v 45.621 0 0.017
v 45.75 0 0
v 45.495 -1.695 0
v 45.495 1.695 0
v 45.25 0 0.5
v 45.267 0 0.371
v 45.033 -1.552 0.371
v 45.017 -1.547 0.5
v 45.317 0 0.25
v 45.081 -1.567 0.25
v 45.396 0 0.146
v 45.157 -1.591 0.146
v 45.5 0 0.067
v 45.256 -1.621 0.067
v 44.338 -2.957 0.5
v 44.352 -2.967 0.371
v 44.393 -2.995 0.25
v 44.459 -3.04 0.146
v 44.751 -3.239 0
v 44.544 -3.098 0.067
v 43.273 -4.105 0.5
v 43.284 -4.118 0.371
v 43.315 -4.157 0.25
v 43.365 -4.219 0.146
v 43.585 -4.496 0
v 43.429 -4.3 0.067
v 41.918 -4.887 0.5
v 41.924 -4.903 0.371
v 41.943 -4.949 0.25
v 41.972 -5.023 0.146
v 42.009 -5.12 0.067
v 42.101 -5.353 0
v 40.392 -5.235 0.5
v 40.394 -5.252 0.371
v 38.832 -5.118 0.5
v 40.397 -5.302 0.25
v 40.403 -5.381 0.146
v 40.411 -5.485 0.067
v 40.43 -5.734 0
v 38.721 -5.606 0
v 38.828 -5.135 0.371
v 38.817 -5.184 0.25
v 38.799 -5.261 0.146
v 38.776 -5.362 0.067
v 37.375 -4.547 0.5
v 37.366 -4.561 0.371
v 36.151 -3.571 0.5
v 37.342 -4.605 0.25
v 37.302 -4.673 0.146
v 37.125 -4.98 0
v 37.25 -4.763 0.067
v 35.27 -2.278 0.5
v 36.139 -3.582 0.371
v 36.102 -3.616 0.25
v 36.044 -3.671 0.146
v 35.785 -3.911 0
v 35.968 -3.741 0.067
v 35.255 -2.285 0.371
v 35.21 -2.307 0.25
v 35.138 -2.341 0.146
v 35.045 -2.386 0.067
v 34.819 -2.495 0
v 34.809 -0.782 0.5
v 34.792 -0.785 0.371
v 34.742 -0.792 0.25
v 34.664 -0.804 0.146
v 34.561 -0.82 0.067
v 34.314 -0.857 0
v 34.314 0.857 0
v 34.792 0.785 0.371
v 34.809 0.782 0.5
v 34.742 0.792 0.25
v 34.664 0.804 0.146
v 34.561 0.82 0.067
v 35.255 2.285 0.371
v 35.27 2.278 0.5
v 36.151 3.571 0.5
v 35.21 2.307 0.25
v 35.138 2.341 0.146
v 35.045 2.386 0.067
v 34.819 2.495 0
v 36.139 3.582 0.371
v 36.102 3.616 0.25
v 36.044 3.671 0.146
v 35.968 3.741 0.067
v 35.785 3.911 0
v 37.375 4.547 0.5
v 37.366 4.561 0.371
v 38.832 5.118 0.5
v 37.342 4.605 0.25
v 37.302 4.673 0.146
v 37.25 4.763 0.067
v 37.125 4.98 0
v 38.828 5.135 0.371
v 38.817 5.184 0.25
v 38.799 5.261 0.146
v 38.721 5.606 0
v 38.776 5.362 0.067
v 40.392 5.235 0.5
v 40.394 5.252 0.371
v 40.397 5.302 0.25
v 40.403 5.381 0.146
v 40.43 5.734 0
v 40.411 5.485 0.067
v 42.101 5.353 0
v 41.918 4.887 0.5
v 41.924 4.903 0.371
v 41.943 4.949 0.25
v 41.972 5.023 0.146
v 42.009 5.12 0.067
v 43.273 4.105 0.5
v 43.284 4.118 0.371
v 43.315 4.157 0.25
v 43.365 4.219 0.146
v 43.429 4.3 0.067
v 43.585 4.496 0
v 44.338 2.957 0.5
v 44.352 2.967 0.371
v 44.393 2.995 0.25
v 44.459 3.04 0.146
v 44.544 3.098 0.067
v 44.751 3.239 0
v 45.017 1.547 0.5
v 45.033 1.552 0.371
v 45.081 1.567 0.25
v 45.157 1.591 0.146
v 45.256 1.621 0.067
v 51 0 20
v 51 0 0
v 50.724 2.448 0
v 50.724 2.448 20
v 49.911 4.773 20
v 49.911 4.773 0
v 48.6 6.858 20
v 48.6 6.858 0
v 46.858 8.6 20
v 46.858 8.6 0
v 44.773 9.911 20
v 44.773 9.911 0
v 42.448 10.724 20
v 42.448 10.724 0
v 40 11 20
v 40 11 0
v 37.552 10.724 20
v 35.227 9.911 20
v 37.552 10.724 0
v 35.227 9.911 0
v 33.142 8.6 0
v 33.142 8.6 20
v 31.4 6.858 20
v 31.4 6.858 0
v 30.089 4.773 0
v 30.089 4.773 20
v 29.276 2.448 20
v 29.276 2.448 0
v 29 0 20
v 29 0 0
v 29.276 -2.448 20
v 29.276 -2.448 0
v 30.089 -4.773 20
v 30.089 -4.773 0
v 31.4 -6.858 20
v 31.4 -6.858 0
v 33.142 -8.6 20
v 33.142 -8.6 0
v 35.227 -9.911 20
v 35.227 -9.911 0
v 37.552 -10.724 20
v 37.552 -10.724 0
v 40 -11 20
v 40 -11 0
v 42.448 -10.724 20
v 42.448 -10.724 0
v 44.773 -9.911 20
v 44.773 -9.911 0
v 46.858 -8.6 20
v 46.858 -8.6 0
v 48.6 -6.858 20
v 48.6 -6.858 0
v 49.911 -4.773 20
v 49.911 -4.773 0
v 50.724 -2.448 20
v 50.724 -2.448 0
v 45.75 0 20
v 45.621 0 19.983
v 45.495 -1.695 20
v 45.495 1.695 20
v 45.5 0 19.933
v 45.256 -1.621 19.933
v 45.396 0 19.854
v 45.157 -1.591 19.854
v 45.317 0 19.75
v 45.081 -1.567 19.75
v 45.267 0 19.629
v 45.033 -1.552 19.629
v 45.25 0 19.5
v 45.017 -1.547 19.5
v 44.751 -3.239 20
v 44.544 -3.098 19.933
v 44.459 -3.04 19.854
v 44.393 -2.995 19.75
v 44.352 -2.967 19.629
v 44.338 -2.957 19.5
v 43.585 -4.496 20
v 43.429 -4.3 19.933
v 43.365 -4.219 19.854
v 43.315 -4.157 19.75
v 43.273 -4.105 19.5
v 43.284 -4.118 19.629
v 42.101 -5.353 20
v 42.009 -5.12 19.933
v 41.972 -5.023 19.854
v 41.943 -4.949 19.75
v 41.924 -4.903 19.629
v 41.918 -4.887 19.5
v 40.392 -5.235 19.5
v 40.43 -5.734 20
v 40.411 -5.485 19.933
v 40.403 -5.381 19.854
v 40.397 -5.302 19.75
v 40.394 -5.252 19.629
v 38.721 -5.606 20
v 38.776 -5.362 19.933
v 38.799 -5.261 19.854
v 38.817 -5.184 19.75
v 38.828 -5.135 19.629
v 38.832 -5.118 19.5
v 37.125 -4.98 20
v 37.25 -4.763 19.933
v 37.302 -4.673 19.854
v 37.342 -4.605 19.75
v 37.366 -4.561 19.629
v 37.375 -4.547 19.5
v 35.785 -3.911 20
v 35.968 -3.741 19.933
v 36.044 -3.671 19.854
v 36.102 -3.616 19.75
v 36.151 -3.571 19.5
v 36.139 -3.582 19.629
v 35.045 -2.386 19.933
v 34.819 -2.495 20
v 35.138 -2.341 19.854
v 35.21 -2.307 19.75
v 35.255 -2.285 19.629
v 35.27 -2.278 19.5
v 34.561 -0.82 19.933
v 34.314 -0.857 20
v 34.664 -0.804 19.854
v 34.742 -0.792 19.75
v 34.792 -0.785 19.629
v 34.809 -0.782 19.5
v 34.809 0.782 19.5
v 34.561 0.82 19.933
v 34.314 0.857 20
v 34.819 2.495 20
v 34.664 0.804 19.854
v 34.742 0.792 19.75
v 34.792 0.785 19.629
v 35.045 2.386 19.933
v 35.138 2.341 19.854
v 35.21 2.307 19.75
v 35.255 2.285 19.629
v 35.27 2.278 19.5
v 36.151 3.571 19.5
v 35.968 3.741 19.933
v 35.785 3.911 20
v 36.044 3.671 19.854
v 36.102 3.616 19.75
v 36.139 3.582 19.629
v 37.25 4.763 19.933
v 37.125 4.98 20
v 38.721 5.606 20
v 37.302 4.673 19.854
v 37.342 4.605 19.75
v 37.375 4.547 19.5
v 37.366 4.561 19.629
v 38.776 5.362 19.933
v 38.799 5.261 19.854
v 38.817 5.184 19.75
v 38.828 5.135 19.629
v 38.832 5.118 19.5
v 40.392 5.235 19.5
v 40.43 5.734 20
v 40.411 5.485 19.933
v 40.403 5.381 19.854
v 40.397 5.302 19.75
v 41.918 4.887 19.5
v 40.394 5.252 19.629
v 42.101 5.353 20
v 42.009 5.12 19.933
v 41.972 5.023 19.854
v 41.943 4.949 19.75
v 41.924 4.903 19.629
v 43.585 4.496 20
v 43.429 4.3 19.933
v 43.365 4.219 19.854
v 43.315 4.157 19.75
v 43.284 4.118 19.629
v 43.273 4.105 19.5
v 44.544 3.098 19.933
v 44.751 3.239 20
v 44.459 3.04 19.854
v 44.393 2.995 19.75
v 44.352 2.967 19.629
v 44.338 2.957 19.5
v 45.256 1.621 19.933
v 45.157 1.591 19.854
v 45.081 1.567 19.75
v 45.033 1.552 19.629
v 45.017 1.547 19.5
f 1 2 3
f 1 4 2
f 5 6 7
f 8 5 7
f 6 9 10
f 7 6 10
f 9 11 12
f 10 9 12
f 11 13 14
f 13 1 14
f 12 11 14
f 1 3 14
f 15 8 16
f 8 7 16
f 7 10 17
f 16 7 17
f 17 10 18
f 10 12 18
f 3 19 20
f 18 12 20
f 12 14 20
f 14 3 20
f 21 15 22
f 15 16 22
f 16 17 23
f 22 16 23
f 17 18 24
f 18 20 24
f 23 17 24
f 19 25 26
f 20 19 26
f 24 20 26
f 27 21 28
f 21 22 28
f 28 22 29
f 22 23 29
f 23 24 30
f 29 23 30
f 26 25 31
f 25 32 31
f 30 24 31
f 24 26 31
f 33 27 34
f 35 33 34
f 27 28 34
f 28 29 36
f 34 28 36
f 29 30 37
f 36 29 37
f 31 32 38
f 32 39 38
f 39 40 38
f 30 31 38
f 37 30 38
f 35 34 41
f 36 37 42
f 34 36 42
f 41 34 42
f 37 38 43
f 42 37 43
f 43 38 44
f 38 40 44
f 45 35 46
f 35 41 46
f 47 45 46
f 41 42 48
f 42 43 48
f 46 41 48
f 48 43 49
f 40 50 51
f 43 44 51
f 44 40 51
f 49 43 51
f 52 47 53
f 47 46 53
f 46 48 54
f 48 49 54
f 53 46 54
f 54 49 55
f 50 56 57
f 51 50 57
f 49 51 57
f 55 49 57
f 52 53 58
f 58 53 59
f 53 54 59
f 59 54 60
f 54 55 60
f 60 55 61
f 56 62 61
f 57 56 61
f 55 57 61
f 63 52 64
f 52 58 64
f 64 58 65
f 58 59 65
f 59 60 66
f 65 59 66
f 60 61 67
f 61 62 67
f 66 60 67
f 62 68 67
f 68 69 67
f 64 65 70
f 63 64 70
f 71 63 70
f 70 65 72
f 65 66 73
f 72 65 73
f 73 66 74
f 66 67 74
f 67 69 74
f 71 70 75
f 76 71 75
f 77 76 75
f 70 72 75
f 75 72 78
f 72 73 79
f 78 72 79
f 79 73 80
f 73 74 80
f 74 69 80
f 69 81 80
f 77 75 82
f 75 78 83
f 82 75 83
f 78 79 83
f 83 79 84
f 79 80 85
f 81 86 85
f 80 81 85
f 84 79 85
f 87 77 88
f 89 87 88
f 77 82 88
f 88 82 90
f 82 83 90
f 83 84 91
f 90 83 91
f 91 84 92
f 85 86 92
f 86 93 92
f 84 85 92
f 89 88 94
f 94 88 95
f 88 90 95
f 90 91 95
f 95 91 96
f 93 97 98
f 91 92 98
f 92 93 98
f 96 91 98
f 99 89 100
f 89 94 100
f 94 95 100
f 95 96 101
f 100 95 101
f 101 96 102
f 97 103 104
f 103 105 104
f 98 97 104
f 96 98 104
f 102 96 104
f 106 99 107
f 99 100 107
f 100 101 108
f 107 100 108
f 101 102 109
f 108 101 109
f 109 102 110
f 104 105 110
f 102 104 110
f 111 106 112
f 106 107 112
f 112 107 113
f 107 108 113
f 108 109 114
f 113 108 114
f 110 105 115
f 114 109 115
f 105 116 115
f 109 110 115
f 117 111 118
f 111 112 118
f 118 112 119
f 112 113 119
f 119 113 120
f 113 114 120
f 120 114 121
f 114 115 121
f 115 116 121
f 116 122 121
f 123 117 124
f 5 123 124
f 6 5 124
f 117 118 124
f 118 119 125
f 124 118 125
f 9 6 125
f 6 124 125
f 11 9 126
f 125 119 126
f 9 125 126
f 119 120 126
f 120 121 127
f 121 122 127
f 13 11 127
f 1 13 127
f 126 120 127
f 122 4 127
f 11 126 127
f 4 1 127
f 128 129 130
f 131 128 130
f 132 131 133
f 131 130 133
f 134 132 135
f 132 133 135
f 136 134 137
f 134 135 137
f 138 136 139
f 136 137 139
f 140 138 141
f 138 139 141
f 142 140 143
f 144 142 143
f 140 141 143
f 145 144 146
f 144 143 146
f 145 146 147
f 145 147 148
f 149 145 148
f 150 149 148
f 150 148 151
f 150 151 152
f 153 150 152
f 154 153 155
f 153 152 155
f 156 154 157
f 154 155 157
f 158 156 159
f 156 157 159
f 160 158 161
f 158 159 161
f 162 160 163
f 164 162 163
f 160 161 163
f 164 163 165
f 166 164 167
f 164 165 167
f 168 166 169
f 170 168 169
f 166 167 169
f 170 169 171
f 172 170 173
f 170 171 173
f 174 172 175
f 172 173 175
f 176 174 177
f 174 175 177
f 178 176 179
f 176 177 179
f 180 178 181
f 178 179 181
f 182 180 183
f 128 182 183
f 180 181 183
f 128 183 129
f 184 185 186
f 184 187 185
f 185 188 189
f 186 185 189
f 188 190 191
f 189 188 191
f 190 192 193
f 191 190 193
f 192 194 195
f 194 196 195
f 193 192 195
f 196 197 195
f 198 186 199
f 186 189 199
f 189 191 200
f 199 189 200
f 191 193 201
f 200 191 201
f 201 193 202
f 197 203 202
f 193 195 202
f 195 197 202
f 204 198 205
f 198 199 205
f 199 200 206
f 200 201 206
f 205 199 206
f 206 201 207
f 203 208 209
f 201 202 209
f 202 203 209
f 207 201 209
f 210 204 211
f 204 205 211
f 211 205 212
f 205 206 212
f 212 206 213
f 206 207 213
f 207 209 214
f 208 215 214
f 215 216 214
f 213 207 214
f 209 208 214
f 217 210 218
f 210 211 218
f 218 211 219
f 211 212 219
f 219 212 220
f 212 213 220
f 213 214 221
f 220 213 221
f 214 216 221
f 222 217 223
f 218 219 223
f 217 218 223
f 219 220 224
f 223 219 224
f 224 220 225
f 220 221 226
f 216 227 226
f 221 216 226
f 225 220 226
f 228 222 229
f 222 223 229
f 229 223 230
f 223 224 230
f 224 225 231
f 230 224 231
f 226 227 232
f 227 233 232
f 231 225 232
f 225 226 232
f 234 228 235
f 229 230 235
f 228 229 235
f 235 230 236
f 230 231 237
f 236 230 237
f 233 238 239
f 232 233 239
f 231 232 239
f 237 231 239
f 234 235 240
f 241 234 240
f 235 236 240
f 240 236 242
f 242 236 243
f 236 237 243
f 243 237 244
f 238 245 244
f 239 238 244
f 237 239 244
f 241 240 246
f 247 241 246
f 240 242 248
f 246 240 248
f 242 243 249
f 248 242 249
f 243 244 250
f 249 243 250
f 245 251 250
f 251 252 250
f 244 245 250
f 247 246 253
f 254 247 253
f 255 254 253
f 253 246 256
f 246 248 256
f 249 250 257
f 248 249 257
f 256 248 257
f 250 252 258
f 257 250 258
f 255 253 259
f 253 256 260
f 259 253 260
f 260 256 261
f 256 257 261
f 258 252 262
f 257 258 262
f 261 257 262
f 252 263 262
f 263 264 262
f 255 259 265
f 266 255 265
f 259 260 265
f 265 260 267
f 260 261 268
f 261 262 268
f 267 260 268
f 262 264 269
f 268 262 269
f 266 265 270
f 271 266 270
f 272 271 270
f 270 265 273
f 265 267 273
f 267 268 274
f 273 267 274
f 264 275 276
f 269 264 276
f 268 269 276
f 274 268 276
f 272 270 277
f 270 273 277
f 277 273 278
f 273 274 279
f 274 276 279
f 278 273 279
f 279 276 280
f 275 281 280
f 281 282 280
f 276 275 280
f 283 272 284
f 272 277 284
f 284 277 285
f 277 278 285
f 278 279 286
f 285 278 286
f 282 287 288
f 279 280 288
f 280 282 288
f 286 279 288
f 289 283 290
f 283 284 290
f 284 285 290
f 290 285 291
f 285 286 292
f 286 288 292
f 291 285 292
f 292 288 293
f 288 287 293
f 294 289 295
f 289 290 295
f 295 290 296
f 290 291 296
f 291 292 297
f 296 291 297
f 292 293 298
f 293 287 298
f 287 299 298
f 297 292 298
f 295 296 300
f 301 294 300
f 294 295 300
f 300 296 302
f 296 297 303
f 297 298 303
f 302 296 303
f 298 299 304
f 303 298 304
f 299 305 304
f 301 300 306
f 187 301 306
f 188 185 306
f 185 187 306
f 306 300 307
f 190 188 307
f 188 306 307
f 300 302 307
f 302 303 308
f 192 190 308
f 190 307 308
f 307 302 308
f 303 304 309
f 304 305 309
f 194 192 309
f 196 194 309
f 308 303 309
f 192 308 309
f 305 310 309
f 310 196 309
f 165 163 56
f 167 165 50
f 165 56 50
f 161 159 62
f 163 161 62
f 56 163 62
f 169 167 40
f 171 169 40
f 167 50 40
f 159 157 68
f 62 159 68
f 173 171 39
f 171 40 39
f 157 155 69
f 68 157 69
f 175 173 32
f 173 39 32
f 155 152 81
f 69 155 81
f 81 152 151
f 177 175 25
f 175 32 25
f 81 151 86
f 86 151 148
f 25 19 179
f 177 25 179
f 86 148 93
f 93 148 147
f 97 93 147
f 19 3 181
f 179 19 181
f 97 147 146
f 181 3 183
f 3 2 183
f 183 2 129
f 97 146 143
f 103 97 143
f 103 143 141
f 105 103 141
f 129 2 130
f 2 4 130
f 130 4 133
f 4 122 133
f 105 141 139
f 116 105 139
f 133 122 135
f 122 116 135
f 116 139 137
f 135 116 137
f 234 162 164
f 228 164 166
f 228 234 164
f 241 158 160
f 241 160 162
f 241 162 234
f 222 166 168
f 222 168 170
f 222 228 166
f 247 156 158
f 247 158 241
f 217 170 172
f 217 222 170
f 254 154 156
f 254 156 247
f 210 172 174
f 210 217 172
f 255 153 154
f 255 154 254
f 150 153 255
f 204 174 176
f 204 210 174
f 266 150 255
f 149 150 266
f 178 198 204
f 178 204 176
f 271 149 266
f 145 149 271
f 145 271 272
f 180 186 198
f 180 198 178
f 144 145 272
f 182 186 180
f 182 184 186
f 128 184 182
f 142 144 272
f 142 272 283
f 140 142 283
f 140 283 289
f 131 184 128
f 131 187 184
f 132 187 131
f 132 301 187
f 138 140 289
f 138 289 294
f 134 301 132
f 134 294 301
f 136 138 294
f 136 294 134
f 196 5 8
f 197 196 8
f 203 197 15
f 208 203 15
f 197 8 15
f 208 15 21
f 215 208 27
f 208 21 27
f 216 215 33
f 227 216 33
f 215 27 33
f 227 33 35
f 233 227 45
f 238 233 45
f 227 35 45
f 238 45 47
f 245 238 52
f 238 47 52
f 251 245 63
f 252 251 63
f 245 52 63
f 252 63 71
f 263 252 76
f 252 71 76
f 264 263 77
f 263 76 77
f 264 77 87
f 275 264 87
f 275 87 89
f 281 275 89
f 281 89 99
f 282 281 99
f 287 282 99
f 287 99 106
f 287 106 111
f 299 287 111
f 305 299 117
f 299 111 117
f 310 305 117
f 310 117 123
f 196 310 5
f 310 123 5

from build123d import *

# Parameters (mm, degrees)
SKETCH002_R     = 11
PAD001_DEPTH    = 20
SKETCH003_R     = 5.25
POCKET001_DEPTH = 20
FILLET005_R     = 0.5
FILLET006_R     = 0.5


with BuildPart() as part:
    # Sketch002 → Pad001 (new body)
    with BuildSketch(Plane.XY):
        with Locations((40, 0)):
            Circle(SKETCH002_R)
    extrude(amount=PAD001_DEPTH)

    # Sketch003 (on Face2 of Pad001) → Pocket001 (cut)
    with BuildSketch(Plane(origin=(0, 0, 0), x_dir=(1, 0, 0), z_dir=(0, 0, -1))):
        with Locations((40, 0)):
            Circle(SKETCH003_R)
    extrude(amount=-POCKET001_DEPTH, mode=Mode.SUBTRACT)

    # Fillet005
    fillet005_edges = [part.edges().sort_by_distance(p)[0] for p in [
        (34.75, 0, 20),
    ]]
    fillet(fillet005_edges, radius=FILLET005_R)

    # Fillet006
    fillet006_edges = [part.edges().sort_by_distance(p)[0] for p in [
        (34.75, 0, 0),
    ]]
    fillet(fillet006_edges, radius=FILLET006_R)


solid = part.part
